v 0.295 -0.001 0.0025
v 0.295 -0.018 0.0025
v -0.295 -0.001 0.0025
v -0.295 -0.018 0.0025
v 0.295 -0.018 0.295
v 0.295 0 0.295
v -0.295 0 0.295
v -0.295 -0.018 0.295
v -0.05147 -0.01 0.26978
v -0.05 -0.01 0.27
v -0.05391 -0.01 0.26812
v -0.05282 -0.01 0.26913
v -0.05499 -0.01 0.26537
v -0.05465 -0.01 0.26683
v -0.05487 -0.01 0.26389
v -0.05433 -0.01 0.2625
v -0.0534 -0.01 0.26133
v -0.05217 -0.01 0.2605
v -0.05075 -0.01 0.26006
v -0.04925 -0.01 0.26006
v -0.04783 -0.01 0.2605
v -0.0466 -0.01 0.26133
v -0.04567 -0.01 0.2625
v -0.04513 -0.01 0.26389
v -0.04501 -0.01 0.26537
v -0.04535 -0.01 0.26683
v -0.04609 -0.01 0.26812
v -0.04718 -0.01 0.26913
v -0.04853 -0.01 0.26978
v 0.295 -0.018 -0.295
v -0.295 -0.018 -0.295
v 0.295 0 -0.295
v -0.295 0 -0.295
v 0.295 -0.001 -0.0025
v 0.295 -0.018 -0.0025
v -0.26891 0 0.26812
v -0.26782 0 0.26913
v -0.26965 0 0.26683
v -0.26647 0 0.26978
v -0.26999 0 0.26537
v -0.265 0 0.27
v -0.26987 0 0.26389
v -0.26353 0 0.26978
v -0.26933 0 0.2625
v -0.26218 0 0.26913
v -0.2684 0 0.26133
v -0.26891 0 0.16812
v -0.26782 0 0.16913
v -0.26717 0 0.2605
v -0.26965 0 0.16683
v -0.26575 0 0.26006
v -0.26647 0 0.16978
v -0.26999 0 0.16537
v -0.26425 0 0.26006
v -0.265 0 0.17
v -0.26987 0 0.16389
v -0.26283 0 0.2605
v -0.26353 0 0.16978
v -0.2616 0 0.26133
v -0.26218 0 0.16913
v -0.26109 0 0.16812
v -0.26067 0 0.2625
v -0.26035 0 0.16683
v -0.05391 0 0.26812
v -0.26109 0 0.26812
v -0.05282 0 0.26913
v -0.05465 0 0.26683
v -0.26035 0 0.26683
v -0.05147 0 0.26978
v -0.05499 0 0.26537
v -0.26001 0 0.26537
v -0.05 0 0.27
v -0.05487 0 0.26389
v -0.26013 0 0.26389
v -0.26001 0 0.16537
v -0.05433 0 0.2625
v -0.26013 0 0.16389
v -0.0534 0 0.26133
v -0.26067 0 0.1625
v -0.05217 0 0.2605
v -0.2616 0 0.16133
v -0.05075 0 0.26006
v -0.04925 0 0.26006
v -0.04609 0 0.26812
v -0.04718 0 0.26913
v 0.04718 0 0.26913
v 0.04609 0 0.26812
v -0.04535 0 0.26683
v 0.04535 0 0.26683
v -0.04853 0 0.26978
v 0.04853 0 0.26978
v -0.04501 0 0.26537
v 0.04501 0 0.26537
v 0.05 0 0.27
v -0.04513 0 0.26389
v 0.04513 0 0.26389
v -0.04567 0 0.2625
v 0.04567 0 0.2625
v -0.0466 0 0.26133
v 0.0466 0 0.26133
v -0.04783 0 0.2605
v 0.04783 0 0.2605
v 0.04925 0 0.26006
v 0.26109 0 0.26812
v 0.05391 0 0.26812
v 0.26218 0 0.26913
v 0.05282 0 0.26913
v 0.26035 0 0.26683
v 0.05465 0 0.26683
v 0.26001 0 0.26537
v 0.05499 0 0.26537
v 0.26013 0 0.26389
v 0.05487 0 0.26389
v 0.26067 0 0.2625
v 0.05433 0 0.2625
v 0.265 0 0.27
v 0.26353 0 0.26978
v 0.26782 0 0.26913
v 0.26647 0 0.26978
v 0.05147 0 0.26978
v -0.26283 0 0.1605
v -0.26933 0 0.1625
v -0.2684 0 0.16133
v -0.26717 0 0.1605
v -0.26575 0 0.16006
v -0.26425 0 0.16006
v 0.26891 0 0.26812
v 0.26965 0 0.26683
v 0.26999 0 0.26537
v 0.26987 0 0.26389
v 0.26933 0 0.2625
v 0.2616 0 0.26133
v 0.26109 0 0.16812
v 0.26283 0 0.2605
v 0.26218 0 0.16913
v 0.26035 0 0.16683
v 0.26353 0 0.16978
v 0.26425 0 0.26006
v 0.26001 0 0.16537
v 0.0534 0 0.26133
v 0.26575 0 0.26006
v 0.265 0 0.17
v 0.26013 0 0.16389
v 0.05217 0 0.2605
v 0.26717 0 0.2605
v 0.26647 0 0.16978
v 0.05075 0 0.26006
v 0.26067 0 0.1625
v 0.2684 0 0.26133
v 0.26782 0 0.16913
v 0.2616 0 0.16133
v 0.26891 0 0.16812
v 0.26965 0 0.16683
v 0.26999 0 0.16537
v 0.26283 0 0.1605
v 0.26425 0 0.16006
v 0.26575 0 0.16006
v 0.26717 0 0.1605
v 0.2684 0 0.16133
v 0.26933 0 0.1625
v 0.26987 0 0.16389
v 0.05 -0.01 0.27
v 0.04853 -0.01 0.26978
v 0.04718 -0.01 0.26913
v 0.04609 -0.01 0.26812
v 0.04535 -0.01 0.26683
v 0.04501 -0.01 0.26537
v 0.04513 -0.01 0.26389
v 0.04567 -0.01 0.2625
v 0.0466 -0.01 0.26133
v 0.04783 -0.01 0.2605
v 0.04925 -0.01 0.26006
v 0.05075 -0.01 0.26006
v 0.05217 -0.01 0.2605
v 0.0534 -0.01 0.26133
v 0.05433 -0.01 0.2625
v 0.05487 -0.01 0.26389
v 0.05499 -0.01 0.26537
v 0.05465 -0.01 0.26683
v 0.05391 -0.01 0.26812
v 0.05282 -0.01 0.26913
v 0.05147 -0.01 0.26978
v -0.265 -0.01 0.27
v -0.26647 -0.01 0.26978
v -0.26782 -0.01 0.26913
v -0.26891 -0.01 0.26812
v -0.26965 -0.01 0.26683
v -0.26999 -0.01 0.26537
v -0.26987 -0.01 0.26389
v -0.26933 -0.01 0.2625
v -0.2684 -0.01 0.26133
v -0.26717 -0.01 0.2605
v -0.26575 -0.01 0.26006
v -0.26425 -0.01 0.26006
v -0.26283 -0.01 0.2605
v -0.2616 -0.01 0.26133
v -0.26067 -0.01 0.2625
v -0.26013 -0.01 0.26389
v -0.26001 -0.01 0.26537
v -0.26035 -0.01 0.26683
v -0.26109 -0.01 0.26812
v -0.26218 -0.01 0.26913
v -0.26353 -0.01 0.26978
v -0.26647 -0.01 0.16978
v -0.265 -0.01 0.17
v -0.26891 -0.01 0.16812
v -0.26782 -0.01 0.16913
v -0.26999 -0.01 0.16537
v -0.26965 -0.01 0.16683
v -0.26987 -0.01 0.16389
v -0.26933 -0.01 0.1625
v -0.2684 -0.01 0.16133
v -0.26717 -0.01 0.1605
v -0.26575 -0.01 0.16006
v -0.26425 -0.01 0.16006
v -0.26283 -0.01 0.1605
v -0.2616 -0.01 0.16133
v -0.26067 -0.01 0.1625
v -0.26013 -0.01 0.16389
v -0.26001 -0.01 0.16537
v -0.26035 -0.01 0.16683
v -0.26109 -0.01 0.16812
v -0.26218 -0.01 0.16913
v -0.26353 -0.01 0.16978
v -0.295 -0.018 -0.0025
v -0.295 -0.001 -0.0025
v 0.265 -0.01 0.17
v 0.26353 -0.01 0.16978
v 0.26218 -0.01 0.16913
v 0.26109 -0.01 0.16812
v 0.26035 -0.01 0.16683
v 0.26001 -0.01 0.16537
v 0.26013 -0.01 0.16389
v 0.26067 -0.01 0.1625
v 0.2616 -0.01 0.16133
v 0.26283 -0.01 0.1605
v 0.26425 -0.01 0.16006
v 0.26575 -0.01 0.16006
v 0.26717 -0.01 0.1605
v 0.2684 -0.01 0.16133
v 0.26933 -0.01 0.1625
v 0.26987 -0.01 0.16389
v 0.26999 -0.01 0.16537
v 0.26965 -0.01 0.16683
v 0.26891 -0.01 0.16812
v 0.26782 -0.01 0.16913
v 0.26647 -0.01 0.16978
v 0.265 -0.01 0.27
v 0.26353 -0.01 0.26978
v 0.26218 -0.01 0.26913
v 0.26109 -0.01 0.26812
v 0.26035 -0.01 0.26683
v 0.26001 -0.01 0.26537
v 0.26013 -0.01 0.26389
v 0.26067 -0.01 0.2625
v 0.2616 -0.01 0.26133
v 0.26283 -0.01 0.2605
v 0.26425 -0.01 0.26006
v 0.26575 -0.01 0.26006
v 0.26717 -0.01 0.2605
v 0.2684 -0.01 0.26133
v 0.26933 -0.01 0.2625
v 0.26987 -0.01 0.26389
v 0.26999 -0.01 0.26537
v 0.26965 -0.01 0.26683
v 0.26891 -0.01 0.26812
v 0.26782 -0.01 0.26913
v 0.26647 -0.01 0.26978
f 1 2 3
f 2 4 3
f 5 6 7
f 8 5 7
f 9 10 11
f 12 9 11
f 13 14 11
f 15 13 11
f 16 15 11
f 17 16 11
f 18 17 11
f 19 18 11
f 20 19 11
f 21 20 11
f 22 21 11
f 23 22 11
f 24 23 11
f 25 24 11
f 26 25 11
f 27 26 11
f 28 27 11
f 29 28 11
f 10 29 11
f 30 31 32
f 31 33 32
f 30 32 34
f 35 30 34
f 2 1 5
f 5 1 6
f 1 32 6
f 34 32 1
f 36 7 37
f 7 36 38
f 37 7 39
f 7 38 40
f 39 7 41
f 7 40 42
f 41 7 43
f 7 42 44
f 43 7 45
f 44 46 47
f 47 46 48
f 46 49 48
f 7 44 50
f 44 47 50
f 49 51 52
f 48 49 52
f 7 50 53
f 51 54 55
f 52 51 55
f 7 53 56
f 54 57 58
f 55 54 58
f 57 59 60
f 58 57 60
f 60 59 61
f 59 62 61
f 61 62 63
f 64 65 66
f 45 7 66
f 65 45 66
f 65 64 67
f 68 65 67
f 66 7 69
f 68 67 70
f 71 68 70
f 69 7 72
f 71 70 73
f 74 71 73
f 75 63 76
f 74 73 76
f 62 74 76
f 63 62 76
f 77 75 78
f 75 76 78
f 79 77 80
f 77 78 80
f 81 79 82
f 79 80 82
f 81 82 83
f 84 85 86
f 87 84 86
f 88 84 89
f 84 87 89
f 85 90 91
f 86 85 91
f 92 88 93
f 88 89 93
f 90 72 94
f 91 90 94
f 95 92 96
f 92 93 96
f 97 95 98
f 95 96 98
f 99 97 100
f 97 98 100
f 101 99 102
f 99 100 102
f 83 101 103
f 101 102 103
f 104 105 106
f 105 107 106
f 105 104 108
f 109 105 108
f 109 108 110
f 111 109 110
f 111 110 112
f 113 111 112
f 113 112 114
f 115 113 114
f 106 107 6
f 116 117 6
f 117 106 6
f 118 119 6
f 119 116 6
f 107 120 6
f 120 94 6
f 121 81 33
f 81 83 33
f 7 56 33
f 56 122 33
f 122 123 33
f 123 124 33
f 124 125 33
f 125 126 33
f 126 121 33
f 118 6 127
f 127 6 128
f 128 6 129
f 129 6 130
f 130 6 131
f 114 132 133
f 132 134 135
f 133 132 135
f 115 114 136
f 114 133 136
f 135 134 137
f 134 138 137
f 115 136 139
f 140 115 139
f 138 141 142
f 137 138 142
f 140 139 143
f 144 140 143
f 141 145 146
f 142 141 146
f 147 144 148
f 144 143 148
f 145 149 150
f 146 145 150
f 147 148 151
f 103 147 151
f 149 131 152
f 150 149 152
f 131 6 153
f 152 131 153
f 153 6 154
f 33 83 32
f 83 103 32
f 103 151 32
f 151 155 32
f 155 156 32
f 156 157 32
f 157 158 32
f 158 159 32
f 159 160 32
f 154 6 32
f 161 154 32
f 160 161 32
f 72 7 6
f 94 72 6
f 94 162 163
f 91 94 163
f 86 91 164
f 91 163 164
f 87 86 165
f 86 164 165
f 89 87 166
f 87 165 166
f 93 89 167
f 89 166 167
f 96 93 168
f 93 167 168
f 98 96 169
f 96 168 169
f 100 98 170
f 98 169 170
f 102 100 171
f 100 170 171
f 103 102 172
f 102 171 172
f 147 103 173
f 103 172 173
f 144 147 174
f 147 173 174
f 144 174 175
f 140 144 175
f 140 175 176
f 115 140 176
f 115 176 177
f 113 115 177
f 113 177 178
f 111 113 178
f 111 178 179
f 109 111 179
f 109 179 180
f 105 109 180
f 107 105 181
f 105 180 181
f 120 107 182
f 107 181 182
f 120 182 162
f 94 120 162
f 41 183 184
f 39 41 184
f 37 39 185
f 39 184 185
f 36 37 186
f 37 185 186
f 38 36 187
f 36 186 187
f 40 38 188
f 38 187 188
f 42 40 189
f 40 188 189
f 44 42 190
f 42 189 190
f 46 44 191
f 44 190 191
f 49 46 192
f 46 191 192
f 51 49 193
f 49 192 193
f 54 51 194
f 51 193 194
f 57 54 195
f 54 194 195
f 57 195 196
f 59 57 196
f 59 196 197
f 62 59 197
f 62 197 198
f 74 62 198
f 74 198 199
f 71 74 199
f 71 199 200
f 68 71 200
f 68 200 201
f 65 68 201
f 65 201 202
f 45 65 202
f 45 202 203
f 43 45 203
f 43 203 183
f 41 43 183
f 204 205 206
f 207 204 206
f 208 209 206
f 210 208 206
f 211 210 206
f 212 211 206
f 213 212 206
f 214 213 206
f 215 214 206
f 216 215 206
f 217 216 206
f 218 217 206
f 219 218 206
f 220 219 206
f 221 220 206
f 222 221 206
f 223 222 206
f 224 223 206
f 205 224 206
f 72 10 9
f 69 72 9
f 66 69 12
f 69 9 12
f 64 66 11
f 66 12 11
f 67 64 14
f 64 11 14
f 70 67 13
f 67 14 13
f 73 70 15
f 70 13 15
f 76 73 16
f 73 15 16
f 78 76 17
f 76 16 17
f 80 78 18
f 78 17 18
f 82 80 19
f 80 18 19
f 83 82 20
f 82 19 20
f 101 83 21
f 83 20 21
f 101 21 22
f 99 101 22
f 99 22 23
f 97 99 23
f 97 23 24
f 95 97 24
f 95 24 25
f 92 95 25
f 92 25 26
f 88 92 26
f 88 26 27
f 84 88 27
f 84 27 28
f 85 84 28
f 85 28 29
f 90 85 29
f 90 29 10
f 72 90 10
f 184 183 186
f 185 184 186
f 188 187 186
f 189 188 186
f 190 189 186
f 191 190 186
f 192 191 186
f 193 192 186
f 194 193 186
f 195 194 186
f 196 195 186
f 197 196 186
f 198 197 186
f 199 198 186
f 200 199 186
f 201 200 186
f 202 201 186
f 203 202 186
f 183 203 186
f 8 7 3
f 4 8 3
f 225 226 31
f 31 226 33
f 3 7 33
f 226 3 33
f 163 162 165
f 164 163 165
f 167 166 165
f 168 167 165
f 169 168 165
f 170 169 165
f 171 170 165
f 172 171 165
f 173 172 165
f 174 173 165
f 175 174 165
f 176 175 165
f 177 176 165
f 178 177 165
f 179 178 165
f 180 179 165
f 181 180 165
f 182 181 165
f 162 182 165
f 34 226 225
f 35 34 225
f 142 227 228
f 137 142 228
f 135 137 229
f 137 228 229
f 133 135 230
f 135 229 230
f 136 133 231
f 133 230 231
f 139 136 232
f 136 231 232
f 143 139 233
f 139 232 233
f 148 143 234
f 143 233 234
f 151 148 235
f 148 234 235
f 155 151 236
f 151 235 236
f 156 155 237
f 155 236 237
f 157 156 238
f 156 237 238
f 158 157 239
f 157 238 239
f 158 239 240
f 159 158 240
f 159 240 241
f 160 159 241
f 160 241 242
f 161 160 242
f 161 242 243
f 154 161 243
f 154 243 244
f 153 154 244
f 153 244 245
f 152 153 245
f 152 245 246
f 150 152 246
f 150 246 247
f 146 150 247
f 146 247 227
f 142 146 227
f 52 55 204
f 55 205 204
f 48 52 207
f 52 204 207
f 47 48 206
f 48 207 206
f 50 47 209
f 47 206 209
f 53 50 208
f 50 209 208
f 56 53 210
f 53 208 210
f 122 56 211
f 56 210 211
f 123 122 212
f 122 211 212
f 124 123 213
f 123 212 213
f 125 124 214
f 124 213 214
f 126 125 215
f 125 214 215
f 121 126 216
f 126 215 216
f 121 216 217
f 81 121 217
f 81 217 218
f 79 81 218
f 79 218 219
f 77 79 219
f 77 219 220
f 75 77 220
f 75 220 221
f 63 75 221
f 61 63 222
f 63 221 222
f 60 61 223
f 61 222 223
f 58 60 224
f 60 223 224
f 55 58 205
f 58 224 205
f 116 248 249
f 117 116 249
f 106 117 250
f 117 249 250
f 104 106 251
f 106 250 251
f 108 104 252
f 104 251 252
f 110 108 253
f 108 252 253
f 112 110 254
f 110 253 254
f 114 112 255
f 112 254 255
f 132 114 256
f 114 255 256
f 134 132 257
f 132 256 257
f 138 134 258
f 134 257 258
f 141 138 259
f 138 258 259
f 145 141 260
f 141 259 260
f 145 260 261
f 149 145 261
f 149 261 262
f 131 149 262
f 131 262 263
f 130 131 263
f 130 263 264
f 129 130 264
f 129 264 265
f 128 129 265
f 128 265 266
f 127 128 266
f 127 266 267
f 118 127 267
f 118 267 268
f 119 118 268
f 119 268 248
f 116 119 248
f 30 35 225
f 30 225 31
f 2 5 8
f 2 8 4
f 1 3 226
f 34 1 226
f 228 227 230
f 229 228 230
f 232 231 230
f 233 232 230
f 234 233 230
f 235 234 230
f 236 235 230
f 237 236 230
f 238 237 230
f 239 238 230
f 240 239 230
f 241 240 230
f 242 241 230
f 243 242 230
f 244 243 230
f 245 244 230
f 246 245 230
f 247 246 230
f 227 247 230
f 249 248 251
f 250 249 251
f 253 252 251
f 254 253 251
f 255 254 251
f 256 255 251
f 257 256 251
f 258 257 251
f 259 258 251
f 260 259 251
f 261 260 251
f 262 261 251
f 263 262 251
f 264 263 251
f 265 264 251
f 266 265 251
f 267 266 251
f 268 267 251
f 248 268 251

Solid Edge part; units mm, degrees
sketch "Sketch1" plane through (0, 0, 0) normal (0, -1, 0) x (1, 0, 0)
  line L0 (-0.295, -0.295) -> (0.295, -0.295)
  line L1 (0.295, -0.295) -> (0.295, 0.295)
  line L2 (0.295, 0.295) -> (-0.295, 0.295)
  line L3 (-0.295, 0.295) -> (-0.295, -0.295)
  dimension "D1" = 0.59
  dimension "D2" = 0.59
extrude "Protrusion1" add sketch "Sketch1" along normal blind 0.018
hole "Bohrung_1" at (-0.05, 0, 0.265) direction (0, -1, 0) diameter 0.01 depth 0.01
hole "Hole1" at (0.05, 0, 0.265) direction (0, -1, 0) diameter 0.01 depth 0.01
hole "Hole2" at (0.265, 0, 0.265) direction (0, -1, 0) diameter 0.01 depth 0.01
hole "Hole3" at (0.265, 0, 0.165) direction (0, -1, 0) diameter 0.01 depth 0.01
hole "Hole4" at (-0.265, 0, 0.165) direction (0, -1, 0) diameter 0.01 depth 0.01
hole "Hole5" at (-0.265, 0, 0.265) direction (0, -1, 0) diameter 0.01 depth 0.01
sketch "Sketch2" plane through (-0.295, -0.009, 0) normal (-1, 0, 0) x (0, 0, 1)
  line L0 (-0.0025, -0.009) -> (0.0025, -0.009)
  line L1 (0.0025, -0.009) -> (0.0025, 0.008)
  line L2 (0.0025, 0.008) -> (-0.0025, 0.008)
  line L3 (-0.0025, 0.008) -> (-0.0025, -0.009)
  dimension "D1" = 0.017
  dimension "D2" = 0.005
extrude "Cutout1" cut sketch "Sketch2" against normal through all
